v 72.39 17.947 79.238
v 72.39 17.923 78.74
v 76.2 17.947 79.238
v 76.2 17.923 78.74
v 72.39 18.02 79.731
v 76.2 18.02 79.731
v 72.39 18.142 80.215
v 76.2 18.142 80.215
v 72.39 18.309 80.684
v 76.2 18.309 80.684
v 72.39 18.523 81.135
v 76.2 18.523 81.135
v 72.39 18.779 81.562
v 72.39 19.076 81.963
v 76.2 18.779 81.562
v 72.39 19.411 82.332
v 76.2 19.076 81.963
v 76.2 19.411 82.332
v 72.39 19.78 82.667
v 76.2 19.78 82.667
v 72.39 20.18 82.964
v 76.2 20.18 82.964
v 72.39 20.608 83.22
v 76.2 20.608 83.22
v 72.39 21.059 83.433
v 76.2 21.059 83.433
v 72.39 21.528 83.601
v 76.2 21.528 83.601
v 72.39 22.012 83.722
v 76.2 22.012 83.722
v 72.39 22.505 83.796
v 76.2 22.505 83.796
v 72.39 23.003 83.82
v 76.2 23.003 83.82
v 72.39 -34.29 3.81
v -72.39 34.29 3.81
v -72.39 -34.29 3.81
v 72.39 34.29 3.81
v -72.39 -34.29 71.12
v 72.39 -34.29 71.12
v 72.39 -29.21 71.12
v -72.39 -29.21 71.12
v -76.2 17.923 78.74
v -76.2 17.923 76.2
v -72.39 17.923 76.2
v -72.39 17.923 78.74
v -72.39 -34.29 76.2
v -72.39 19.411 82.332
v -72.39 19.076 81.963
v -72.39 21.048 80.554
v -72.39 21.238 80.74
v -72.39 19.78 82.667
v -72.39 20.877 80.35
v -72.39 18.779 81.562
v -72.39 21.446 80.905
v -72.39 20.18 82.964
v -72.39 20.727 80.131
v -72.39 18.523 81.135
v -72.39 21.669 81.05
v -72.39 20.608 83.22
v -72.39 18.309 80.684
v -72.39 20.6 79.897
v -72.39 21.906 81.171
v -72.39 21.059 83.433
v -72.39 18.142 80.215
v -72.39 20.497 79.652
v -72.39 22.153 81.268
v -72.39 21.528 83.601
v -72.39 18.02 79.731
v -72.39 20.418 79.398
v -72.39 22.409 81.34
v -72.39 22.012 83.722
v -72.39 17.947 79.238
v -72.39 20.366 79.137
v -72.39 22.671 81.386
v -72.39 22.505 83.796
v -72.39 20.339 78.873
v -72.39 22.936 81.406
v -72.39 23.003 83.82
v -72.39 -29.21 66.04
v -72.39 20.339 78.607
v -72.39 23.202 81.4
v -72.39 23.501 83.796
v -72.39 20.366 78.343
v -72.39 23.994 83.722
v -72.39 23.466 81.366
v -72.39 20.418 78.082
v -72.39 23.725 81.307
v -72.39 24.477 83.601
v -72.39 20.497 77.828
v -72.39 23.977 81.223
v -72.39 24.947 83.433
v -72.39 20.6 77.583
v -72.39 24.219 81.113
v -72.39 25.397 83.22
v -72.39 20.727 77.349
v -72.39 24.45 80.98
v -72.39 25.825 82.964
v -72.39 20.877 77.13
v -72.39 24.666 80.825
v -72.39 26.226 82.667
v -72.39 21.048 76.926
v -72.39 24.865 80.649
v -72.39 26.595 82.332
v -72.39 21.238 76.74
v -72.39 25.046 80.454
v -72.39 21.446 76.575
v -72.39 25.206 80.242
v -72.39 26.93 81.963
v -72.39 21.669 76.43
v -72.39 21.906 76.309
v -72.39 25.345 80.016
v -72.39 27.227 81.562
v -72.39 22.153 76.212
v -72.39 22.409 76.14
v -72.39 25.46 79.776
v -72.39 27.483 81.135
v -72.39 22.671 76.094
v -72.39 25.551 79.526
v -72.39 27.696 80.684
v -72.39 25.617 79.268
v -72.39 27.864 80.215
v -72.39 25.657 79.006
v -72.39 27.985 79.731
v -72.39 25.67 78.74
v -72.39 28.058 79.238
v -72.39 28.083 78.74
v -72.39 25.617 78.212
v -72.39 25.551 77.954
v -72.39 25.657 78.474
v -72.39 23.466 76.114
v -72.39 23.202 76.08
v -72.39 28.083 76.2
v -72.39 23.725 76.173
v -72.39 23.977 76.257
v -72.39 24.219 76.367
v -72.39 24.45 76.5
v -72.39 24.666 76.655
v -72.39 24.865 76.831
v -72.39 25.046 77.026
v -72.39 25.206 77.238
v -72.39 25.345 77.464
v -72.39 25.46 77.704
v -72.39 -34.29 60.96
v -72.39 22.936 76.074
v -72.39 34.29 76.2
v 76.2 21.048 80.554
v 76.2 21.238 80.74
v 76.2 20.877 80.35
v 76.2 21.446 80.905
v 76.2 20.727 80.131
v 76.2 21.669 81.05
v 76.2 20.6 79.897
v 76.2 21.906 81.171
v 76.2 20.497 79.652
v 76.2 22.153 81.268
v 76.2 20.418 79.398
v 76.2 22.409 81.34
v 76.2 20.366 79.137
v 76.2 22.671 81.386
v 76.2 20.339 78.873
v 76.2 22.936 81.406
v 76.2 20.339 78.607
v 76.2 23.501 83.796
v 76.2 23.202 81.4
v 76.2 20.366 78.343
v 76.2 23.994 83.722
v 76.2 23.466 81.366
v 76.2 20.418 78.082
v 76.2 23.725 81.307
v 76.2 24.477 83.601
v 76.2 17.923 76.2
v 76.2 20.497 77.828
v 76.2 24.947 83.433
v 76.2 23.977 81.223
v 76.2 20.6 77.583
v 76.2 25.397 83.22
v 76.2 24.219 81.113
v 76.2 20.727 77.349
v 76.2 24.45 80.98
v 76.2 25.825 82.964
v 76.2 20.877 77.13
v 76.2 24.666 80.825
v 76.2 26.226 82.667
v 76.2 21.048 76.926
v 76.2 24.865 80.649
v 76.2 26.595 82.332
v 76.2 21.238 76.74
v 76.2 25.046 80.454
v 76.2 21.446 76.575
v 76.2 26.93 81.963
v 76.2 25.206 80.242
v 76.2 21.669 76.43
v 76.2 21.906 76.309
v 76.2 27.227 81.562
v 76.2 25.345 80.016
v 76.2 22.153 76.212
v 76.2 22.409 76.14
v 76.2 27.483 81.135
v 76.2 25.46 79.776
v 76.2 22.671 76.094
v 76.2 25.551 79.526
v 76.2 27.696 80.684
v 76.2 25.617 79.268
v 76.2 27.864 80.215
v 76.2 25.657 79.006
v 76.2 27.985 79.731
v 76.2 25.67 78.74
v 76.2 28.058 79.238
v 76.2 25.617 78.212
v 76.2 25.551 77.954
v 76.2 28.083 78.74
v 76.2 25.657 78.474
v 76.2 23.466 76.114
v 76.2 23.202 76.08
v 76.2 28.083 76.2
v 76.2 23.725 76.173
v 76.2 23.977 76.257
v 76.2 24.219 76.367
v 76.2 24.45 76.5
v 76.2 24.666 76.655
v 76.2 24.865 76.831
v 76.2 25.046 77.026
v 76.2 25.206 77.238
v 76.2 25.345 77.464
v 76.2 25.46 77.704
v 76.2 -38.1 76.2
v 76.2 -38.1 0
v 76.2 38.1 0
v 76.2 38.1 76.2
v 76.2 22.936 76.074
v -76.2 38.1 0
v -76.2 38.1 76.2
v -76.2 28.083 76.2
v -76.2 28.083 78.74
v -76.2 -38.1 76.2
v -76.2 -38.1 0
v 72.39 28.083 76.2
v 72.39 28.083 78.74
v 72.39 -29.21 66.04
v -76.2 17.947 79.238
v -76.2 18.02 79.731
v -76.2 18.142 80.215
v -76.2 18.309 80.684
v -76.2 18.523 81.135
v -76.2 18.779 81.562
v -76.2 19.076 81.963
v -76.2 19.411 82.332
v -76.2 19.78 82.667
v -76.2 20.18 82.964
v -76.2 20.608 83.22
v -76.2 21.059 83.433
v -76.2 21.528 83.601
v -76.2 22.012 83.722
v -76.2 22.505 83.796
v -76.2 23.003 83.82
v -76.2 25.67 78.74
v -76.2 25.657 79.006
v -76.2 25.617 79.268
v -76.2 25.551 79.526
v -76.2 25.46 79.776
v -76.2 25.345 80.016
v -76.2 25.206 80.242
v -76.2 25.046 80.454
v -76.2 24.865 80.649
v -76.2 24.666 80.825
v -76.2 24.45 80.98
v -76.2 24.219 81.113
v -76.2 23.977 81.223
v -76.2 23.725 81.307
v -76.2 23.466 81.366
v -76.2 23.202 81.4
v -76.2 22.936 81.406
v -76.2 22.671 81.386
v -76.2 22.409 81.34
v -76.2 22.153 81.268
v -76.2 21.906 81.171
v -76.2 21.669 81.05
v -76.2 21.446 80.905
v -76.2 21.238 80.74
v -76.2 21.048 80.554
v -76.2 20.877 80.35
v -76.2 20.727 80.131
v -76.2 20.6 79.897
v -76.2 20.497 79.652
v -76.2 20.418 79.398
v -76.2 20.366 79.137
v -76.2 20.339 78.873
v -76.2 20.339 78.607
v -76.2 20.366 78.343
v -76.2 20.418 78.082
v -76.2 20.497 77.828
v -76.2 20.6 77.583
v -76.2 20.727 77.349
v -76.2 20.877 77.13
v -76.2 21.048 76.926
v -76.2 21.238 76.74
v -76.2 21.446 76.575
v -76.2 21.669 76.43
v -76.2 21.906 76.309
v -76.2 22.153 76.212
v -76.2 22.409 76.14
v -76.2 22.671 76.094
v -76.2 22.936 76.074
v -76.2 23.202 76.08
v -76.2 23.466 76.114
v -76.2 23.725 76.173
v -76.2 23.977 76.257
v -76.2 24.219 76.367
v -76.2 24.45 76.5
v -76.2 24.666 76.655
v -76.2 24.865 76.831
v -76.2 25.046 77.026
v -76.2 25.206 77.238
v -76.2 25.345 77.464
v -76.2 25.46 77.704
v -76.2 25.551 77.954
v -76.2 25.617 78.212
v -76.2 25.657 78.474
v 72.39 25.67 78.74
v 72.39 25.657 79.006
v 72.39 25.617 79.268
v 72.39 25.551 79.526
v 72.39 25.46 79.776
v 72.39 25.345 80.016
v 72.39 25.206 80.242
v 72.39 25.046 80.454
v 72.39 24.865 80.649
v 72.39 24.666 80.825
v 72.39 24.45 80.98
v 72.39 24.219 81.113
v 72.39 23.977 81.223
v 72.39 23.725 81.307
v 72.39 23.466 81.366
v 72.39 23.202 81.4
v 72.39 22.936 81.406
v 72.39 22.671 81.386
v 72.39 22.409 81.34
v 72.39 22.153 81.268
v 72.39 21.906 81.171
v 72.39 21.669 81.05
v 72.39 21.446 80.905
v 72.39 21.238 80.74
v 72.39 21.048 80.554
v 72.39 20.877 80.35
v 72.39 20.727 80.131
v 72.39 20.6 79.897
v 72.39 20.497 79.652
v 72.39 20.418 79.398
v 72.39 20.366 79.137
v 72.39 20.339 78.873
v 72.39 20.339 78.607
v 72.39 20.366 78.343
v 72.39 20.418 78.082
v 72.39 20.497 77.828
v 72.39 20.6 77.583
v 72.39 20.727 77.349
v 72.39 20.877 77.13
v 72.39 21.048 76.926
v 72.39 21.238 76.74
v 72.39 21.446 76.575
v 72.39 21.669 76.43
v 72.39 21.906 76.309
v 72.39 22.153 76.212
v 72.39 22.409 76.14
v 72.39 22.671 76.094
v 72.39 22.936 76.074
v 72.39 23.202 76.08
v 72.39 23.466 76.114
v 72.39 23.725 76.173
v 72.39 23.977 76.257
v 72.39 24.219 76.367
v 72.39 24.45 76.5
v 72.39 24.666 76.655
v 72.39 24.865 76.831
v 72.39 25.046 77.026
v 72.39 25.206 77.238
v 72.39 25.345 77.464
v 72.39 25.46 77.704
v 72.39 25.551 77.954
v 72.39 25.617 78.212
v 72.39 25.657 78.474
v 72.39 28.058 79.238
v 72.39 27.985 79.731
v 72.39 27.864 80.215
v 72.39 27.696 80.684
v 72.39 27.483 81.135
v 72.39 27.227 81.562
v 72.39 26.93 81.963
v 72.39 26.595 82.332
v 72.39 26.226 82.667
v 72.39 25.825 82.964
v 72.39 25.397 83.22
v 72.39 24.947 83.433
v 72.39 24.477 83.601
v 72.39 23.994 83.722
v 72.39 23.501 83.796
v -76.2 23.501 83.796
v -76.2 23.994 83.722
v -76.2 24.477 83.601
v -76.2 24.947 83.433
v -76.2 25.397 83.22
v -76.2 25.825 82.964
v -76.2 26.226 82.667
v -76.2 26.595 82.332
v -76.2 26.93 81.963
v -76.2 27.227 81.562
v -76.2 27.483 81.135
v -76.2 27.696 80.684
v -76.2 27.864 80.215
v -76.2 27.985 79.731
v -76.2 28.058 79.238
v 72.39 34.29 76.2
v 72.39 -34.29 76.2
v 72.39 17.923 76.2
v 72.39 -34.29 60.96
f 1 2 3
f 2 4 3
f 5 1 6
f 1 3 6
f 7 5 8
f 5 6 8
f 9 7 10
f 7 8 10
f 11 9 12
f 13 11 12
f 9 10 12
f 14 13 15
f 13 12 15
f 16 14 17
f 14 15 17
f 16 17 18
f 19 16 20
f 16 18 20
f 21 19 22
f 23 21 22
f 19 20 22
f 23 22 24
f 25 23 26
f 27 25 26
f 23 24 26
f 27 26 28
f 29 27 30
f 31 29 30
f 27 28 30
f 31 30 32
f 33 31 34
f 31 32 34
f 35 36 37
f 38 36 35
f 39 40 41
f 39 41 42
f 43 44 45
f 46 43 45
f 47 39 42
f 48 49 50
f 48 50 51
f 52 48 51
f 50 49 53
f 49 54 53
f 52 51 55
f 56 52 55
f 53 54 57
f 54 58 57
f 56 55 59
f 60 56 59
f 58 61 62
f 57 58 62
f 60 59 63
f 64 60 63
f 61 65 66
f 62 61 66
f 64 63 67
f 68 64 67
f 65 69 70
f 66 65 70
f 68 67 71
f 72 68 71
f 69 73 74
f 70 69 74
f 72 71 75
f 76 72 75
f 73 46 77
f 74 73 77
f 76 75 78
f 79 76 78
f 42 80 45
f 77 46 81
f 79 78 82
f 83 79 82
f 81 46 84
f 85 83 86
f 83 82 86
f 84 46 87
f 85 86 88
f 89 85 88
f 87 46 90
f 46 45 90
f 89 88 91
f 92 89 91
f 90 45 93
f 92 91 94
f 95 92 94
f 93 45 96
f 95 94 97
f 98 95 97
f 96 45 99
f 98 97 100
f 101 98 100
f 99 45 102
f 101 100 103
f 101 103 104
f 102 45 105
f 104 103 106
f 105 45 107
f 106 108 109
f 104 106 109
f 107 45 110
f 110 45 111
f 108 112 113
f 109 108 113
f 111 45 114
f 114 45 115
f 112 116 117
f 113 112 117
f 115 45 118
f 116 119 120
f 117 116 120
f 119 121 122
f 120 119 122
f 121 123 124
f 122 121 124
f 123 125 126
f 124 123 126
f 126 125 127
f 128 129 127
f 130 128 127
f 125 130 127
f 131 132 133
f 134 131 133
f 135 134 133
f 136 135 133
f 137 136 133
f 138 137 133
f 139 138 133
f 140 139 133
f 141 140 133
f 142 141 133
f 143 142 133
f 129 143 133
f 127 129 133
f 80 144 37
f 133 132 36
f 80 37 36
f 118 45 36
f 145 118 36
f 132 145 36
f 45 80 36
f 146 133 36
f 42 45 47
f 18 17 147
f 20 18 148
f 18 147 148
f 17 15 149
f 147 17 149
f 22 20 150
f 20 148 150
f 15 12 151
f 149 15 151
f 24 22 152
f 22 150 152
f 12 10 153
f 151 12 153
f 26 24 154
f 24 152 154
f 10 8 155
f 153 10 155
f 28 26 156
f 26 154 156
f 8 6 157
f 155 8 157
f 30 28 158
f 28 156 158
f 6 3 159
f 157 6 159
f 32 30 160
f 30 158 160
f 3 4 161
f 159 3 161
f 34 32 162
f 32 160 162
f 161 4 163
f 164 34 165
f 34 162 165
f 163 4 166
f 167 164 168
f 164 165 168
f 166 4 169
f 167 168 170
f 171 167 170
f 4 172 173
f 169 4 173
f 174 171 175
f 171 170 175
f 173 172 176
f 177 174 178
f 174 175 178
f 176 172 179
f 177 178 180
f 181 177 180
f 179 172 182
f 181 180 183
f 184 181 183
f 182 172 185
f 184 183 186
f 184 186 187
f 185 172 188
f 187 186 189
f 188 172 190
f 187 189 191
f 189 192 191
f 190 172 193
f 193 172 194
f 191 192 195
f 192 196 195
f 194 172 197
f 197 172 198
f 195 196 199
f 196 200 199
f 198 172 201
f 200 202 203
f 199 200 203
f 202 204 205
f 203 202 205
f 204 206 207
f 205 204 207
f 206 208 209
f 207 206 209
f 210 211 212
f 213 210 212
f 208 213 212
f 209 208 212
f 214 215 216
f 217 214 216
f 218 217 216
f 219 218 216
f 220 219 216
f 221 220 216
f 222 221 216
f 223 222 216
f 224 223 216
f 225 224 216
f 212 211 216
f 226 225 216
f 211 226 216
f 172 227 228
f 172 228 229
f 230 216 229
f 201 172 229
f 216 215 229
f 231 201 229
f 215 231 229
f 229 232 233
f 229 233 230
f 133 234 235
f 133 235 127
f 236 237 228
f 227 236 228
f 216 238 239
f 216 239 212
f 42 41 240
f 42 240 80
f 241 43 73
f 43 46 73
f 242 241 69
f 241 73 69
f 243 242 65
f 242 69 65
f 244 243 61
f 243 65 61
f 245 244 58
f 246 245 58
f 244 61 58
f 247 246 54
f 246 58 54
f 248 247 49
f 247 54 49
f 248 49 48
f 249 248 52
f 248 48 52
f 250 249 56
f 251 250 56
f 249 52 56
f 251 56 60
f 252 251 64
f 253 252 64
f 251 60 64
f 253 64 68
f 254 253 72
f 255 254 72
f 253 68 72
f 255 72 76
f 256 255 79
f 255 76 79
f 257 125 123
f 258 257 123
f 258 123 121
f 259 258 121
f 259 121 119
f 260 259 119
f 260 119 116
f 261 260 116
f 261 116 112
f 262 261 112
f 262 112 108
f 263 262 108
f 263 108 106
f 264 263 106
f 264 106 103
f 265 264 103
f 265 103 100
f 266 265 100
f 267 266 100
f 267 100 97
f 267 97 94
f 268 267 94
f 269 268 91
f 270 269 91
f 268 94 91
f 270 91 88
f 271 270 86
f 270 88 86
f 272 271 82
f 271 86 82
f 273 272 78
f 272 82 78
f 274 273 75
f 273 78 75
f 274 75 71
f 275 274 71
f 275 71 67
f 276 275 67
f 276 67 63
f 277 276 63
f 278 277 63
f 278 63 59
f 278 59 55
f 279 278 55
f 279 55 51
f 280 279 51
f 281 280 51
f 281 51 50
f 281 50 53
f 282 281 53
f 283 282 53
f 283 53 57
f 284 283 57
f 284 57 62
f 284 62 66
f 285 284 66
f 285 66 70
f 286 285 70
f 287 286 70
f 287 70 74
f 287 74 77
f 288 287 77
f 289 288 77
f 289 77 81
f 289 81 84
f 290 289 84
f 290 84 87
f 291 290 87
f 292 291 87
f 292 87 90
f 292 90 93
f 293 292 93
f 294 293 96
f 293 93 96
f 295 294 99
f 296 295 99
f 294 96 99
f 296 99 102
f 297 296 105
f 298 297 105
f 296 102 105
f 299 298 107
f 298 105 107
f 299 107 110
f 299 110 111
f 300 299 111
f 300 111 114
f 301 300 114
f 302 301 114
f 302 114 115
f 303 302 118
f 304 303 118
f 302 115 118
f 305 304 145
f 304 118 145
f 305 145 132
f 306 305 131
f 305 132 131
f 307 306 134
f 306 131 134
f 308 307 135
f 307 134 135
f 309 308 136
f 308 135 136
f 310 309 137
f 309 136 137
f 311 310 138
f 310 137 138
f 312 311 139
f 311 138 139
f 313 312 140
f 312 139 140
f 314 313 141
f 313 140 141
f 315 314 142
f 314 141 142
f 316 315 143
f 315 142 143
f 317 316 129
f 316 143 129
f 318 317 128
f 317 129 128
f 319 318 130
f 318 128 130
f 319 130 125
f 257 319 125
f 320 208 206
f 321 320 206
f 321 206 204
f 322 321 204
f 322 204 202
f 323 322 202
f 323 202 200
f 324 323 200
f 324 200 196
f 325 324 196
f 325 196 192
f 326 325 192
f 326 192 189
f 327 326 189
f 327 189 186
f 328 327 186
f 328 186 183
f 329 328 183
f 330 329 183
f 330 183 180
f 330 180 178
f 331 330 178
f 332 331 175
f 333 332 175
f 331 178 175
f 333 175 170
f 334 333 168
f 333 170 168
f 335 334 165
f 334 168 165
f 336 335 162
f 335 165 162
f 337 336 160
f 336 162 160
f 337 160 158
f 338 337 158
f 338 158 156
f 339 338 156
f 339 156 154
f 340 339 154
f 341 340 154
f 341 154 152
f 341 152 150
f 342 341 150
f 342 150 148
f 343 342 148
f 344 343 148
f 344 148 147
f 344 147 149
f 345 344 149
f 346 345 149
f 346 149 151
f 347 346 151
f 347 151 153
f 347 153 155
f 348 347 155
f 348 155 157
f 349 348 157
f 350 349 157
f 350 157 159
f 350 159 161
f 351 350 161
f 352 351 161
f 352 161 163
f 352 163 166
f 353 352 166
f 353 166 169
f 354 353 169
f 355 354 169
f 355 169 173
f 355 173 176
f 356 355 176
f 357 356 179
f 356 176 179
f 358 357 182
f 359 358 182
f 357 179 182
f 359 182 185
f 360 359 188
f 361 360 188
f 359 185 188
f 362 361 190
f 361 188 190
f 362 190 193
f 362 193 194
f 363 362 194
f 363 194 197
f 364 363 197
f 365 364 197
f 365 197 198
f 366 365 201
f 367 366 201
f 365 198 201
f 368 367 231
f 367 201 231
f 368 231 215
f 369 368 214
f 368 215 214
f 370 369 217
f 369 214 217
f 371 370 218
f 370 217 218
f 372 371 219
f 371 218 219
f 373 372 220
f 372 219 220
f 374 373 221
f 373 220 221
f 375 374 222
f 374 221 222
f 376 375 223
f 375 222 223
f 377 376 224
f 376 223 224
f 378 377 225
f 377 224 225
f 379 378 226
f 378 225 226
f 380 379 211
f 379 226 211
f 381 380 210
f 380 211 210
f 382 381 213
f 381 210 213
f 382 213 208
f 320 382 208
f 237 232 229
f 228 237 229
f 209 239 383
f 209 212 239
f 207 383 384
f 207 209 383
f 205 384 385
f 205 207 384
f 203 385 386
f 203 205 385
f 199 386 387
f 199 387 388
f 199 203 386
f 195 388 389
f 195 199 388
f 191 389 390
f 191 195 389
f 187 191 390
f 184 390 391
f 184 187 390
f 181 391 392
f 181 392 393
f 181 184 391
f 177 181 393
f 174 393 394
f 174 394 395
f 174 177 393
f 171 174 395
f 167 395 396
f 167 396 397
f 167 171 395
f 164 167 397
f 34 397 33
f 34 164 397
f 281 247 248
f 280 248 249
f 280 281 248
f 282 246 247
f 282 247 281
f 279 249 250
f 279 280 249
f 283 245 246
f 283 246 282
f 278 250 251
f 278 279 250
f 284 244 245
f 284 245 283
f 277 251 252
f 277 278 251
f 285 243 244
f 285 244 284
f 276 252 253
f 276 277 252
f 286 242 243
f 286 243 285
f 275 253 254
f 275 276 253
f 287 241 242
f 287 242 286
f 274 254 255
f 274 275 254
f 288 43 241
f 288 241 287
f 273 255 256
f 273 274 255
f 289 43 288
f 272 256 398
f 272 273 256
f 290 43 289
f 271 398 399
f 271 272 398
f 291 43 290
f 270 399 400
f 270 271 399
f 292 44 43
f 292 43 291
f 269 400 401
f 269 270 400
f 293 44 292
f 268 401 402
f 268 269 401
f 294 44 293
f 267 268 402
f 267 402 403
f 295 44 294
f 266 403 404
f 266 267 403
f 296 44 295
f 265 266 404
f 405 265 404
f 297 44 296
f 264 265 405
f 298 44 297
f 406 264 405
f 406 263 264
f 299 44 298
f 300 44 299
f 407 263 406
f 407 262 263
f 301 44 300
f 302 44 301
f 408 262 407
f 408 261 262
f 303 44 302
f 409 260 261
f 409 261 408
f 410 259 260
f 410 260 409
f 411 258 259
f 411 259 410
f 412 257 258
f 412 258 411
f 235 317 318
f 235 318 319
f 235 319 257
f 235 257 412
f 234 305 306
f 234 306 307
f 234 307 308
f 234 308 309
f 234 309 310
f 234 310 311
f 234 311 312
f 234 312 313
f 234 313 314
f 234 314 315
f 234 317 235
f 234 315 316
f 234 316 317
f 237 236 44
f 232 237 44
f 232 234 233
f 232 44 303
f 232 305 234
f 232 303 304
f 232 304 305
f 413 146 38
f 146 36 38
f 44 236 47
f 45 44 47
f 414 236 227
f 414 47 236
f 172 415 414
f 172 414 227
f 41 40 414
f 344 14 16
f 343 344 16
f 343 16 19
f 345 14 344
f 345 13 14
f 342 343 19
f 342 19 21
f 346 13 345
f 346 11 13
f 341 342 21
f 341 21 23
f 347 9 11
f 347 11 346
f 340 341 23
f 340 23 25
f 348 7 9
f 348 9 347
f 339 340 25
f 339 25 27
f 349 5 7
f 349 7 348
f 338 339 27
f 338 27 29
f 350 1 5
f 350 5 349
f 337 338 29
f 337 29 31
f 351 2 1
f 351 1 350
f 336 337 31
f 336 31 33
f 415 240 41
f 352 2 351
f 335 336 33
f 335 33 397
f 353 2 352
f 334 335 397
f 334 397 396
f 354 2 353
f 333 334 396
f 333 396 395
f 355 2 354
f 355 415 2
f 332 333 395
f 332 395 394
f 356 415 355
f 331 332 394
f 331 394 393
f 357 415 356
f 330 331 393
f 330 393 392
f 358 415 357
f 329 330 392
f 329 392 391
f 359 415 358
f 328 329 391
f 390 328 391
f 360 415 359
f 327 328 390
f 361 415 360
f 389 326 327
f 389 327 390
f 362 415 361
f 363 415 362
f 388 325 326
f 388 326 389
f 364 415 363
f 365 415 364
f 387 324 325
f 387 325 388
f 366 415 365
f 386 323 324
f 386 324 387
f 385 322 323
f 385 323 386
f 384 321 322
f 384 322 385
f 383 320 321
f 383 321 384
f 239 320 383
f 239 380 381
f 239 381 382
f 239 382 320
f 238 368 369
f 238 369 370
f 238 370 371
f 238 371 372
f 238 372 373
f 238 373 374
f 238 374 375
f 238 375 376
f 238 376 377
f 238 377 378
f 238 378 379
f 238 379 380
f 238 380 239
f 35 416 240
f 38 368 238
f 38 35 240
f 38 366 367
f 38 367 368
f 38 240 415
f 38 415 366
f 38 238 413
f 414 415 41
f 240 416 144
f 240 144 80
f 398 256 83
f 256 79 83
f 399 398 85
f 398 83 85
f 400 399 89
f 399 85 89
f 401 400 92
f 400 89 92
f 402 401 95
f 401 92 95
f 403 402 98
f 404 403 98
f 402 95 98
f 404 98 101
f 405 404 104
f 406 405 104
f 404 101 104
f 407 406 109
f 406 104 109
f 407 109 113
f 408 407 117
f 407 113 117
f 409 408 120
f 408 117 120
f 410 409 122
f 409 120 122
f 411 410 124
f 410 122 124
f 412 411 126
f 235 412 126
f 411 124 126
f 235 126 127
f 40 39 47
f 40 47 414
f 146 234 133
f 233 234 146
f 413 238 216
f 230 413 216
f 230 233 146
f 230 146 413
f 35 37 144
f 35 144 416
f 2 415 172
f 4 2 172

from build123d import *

# Parameters (mm, degrees)
F0_W      = 152.4
F0_H      = 76.2
F1_DEPTH  = 76.2
F2_T      = -3.81
F3_W      = 3.81
F3_H      = 10.16
F4_DEPTH  = 7.62
F5_R      = 2.667
F6_DEPTH  = 152.401
F7_R      = 5.07999
F8_W      = 144.78
F8_H      = 5.08
F9_DEPTH  = 5.08
F11_DEPTH = 144.78


# Not quite as in the source:
# - a fillet or chamfer is up to 0.001 mm smaller than in the source, because OpenCascade refuses the exact size


with BuildPart() as f1:
    # F0 (on Top) → F1 (new body)
    with BuildSketch(Plane.XY):
        Rectangle(F0_W, F0_H)
    extrude(amount=F1_DEPTH)

    # F2
    f2_openings = [f1.faces().sort_by_distance(p)[0] for p in [
        (0, 0, 76.2),
    ]]
    offset(amount=F2_T, openings=f2_openings)

    # F3 (on face) → F4 (join)
    with BuildSketch(Plane.XY.offset(76.2)):
        with Locations((-74.295, 23.0027831805)):
            Rectangle(F3_W, F3_H)
        with Locations((74.295, 23.0027831805)):
            Rectangle(F3_W, F3_H)
    extrude(amount=F4_DEPTH)

    # F5 (on face) → F6 (cut, through all)
    with BuildSketch(Plane.YZ.offset(76.2)):
        with Locations((23.0027831805, 78.74)):
            Circle(F5_R)
    extrude(amount=-F6_DEPTH, mode=Mode.SUBTRACT)

    # F7 (radius 5.08 in the source; OpenCascade refuses exactly that, so slightly less here)
    f7_edges = [f1.edges().sort_by_distance(p)[0] for p in [
        (74.295, 17.922783, 83.82),
        (74.295, 28.082783, 83.82),
        (-74.295, 28.082783, 83.82),
        (-74.295, 17.922783, 83.82),
    ]]
    fillet(f7_edges, radius=F7_R)

    # F8 (on face) → F9 (join)
    with BuildSketch(Plane(origin=(0, -34.29, 0), x_dir=(-1, 0, 0), z_dir=(0, 1, 0))):
        with Locations((0, 68.58)):
            Rectangle(F8_W, F8_H)
    extrude(amount=F9_DEPTH)

    # F10 (on face) → F11 (join)
    with BuildSketch(Plane.YZ.offset(-72.39)):
        Polygon((-34.29, 60.96), (-29.21, 66.04), (-34.29, 66.04), align=None)
    extrude(amount=F11_DEPTH)


solid = f1.part
